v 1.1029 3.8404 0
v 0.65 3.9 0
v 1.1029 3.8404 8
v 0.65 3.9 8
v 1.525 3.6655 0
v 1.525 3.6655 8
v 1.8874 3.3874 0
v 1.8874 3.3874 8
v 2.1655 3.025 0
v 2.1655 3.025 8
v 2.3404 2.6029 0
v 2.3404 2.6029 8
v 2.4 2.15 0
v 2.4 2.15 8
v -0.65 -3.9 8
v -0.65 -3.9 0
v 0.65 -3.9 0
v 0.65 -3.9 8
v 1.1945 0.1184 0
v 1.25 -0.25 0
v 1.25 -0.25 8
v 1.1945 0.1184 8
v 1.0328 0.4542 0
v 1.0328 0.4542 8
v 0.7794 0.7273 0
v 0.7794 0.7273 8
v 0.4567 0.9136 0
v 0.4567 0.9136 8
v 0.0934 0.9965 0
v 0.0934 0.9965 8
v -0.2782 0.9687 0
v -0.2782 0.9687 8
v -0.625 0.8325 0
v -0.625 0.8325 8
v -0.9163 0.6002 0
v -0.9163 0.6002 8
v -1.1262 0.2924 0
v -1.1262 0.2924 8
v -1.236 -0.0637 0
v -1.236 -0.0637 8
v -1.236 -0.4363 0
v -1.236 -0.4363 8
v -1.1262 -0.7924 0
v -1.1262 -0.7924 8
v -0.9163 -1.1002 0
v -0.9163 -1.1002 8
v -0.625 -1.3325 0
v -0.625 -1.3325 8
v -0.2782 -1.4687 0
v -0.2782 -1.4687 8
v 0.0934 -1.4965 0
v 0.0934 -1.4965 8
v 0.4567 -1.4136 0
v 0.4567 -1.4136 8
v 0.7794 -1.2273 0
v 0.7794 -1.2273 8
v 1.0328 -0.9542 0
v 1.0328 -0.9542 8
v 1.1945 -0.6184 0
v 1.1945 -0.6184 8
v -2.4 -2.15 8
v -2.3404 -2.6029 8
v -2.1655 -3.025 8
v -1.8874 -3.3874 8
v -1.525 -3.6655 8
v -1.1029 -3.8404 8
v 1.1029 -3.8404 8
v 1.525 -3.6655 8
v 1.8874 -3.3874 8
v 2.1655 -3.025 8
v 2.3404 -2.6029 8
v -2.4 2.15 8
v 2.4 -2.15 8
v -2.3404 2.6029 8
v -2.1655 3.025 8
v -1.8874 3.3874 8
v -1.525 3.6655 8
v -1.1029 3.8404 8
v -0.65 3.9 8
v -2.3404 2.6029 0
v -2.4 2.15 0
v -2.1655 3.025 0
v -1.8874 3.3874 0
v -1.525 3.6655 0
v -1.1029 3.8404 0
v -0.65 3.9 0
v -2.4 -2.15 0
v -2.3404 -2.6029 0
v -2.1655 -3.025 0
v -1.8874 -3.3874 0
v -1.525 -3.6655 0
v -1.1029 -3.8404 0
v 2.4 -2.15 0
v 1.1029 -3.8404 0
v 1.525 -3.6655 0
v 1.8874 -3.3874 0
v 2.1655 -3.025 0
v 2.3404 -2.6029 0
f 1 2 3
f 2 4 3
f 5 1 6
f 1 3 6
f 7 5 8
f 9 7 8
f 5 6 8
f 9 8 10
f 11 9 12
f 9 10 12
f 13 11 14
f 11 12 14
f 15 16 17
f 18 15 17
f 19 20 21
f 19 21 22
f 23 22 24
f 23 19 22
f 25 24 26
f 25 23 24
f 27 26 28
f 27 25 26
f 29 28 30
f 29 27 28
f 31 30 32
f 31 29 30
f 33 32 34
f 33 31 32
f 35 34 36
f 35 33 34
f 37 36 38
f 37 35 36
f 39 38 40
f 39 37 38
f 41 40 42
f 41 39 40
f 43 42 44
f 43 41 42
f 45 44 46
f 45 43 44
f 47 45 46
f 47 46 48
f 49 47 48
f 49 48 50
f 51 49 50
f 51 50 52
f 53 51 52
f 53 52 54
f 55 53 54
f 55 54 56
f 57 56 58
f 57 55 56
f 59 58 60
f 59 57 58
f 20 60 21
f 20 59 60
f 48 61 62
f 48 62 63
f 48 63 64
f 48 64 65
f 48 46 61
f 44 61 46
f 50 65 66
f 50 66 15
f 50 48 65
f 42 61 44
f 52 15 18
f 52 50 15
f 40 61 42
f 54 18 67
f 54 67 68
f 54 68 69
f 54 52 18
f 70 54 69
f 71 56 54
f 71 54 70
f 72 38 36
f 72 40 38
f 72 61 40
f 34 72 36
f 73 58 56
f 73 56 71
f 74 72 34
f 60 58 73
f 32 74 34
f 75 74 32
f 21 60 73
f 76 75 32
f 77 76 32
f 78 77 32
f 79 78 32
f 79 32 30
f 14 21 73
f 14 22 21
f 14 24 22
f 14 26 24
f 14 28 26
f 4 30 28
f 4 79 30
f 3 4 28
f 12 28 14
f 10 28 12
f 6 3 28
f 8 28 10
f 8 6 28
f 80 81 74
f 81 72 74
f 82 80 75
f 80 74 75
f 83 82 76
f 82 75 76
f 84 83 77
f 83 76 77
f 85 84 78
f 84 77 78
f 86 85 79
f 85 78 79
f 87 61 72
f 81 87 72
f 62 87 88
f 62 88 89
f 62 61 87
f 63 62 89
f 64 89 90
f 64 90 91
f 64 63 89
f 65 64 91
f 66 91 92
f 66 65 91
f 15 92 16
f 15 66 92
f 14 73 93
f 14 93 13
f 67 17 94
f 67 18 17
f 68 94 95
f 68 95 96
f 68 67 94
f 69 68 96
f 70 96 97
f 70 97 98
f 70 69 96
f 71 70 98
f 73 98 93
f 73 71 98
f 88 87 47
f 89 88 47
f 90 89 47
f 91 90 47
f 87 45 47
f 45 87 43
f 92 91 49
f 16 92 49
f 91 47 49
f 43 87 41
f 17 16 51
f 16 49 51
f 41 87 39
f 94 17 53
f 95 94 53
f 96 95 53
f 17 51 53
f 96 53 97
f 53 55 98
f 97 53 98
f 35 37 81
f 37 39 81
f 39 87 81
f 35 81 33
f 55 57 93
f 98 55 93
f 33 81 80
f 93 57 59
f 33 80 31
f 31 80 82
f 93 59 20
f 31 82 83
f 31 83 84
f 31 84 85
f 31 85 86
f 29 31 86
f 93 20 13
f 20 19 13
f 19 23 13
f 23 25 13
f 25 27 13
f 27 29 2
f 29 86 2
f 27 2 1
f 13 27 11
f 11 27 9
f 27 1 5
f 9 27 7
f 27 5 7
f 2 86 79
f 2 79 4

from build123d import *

# Parameters (mm, degrees)
F0_W     = 4.8
F0_H     = 7.8
F0_R     = 1.25
F1_DEPTH = 8
F2_R     = 1.75


with BuildPart() as f1:
    # F0 (on Top) → F1 (new body)
    with BuildSketch(Plane.XY):
        Rectangle(F0_W, F0_H)
        with Locations((0, -0.25)):
            Circle(F0_R, mode=Mode.SUBTRACT)
    extrude(amount=F1_DEPTH)

    # F2
    f2_edges = [f1.edges().sort_by_distance(p)[0] for p in [
        (-2.4, -3.9, 4),
        (2.4, -3.9, 4),
        (2.4, 3.9, 4),
        (-2.4, 3.9, 4),
    ]]
    fillet(f2_edges, radius=F2_R)


solid = f1.part
